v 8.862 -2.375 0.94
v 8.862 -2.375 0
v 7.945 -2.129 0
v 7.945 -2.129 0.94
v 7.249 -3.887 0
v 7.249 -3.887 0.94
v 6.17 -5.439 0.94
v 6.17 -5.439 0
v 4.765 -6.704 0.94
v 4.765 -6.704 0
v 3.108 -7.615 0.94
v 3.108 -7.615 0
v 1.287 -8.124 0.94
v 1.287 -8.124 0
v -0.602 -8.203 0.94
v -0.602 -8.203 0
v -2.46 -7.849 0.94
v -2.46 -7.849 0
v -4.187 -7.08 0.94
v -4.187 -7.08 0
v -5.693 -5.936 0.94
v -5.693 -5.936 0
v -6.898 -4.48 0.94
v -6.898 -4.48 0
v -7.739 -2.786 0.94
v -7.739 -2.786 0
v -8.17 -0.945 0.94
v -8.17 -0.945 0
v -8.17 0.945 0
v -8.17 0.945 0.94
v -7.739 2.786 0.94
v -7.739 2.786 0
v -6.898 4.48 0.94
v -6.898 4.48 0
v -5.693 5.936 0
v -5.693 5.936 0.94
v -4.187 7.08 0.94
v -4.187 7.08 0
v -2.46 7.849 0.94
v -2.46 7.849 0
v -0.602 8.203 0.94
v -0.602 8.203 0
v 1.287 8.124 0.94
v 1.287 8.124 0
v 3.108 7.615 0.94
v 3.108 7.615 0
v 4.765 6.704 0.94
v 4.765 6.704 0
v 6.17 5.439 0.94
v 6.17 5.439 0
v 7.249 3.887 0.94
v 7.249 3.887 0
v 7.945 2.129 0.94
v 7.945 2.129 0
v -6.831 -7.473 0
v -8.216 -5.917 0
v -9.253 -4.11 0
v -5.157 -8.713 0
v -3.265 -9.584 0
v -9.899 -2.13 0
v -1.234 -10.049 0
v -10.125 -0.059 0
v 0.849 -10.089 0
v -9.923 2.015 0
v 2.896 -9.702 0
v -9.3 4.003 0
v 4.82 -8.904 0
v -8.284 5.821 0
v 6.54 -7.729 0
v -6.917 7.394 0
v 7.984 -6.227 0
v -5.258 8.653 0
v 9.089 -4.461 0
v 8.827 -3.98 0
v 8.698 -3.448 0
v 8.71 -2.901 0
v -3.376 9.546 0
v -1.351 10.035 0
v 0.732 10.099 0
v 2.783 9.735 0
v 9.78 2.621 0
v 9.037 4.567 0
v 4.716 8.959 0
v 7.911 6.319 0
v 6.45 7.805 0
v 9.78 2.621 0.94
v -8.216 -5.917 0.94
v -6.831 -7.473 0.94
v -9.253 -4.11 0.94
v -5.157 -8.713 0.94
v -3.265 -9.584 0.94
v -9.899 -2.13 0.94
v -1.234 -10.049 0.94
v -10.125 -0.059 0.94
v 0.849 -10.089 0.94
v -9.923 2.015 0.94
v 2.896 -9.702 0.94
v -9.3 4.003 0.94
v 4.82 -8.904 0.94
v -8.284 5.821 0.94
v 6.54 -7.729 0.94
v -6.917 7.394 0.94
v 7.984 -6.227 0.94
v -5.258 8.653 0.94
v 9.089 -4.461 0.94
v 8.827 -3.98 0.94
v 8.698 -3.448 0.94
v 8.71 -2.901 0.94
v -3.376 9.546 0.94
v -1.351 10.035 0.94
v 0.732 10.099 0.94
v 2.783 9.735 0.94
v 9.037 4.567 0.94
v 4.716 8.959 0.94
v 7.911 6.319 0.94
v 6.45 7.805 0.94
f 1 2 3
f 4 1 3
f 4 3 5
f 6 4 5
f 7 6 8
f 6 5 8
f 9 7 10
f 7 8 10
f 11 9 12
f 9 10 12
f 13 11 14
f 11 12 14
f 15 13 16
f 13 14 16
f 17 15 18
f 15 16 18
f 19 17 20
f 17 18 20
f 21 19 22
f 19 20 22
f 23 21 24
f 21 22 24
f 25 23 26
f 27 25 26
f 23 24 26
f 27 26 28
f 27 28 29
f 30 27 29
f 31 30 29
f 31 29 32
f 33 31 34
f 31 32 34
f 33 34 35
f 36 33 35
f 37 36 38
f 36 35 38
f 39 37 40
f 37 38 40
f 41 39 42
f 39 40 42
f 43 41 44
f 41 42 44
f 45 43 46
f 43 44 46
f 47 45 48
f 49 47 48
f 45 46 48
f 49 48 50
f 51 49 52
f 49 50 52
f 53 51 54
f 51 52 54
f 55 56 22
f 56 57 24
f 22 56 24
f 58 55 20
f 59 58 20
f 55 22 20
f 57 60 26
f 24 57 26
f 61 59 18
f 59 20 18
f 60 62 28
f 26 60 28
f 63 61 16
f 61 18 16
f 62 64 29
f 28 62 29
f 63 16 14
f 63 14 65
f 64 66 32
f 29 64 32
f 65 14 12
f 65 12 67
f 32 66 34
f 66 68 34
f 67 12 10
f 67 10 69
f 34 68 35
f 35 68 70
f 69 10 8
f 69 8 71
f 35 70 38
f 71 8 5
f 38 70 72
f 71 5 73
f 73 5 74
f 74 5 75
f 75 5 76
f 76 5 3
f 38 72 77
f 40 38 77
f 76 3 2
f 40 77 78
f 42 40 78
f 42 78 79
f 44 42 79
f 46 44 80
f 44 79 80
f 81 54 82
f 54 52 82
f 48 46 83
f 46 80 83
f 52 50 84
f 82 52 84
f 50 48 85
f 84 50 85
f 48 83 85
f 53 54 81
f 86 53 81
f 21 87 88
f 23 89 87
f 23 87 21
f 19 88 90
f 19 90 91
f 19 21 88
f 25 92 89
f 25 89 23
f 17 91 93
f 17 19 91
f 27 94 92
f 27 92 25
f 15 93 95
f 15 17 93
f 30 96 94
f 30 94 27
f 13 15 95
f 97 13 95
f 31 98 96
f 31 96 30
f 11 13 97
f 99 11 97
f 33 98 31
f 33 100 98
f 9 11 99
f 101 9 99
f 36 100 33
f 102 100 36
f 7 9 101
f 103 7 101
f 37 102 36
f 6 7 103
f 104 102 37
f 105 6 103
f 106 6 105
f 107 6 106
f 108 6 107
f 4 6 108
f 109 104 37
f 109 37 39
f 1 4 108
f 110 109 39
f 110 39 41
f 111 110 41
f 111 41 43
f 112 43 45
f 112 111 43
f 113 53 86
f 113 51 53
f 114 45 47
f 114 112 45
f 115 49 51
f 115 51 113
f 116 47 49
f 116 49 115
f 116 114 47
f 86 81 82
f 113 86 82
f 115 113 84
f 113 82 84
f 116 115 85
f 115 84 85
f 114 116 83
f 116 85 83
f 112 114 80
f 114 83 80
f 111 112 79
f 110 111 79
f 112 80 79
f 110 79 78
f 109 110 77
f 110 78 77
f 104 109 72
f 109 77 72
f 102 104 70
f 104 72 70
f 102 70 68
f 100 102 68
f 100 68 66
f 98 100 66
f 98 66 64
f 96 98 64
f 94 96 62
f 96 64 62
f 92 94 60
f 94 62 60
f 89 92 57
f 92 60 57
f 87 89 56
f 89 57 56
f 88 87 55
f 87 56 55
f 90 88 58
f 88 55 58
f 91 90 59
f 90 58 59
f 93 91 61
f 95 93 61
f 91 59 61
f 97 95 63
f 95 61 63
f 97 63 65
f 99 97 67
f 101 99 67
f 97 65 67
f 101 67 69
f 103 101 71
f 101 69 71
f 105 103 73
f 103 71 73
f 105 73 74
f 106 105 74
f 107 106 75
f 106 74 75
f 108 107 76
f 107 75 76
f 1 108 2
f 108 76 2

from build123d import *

# Parameters (mm, degrees)
BOSS_EXTRUDE1_DEPTH = 0.94


with BuildPart() as part:
    # Sketch2 → Boss-Extrude1 (new body)
    with BuildSketch(Plane.XY):
        with BuildLine():
            Line((7.944739921, 2.128786646), (8.862369456, 2.374664739))
            Line((8.862369456, 2.374664739), (9.779998991, 2.620542832))
            ThreePointArc((9.779998991, 2.620542832), (-10.077153498, 0.983159385), (9.089055299, -4.46146823))
            ThreePointArc((9.089055299, -4.46146823), (8.698265252, -3.448205084), (8.862369456, -2.374664739))
            Line((8.862369456, -2.374664739), (7.944739921, -2.128786646))
            ThreePointArc((7.944739921, -2.128786646), (-8.225, 0), (7.944739921, 2.128786646))
        make_face()
    extrude(amount=BOSS_EXTRUDE1_DEPTH)


solid = part.part
